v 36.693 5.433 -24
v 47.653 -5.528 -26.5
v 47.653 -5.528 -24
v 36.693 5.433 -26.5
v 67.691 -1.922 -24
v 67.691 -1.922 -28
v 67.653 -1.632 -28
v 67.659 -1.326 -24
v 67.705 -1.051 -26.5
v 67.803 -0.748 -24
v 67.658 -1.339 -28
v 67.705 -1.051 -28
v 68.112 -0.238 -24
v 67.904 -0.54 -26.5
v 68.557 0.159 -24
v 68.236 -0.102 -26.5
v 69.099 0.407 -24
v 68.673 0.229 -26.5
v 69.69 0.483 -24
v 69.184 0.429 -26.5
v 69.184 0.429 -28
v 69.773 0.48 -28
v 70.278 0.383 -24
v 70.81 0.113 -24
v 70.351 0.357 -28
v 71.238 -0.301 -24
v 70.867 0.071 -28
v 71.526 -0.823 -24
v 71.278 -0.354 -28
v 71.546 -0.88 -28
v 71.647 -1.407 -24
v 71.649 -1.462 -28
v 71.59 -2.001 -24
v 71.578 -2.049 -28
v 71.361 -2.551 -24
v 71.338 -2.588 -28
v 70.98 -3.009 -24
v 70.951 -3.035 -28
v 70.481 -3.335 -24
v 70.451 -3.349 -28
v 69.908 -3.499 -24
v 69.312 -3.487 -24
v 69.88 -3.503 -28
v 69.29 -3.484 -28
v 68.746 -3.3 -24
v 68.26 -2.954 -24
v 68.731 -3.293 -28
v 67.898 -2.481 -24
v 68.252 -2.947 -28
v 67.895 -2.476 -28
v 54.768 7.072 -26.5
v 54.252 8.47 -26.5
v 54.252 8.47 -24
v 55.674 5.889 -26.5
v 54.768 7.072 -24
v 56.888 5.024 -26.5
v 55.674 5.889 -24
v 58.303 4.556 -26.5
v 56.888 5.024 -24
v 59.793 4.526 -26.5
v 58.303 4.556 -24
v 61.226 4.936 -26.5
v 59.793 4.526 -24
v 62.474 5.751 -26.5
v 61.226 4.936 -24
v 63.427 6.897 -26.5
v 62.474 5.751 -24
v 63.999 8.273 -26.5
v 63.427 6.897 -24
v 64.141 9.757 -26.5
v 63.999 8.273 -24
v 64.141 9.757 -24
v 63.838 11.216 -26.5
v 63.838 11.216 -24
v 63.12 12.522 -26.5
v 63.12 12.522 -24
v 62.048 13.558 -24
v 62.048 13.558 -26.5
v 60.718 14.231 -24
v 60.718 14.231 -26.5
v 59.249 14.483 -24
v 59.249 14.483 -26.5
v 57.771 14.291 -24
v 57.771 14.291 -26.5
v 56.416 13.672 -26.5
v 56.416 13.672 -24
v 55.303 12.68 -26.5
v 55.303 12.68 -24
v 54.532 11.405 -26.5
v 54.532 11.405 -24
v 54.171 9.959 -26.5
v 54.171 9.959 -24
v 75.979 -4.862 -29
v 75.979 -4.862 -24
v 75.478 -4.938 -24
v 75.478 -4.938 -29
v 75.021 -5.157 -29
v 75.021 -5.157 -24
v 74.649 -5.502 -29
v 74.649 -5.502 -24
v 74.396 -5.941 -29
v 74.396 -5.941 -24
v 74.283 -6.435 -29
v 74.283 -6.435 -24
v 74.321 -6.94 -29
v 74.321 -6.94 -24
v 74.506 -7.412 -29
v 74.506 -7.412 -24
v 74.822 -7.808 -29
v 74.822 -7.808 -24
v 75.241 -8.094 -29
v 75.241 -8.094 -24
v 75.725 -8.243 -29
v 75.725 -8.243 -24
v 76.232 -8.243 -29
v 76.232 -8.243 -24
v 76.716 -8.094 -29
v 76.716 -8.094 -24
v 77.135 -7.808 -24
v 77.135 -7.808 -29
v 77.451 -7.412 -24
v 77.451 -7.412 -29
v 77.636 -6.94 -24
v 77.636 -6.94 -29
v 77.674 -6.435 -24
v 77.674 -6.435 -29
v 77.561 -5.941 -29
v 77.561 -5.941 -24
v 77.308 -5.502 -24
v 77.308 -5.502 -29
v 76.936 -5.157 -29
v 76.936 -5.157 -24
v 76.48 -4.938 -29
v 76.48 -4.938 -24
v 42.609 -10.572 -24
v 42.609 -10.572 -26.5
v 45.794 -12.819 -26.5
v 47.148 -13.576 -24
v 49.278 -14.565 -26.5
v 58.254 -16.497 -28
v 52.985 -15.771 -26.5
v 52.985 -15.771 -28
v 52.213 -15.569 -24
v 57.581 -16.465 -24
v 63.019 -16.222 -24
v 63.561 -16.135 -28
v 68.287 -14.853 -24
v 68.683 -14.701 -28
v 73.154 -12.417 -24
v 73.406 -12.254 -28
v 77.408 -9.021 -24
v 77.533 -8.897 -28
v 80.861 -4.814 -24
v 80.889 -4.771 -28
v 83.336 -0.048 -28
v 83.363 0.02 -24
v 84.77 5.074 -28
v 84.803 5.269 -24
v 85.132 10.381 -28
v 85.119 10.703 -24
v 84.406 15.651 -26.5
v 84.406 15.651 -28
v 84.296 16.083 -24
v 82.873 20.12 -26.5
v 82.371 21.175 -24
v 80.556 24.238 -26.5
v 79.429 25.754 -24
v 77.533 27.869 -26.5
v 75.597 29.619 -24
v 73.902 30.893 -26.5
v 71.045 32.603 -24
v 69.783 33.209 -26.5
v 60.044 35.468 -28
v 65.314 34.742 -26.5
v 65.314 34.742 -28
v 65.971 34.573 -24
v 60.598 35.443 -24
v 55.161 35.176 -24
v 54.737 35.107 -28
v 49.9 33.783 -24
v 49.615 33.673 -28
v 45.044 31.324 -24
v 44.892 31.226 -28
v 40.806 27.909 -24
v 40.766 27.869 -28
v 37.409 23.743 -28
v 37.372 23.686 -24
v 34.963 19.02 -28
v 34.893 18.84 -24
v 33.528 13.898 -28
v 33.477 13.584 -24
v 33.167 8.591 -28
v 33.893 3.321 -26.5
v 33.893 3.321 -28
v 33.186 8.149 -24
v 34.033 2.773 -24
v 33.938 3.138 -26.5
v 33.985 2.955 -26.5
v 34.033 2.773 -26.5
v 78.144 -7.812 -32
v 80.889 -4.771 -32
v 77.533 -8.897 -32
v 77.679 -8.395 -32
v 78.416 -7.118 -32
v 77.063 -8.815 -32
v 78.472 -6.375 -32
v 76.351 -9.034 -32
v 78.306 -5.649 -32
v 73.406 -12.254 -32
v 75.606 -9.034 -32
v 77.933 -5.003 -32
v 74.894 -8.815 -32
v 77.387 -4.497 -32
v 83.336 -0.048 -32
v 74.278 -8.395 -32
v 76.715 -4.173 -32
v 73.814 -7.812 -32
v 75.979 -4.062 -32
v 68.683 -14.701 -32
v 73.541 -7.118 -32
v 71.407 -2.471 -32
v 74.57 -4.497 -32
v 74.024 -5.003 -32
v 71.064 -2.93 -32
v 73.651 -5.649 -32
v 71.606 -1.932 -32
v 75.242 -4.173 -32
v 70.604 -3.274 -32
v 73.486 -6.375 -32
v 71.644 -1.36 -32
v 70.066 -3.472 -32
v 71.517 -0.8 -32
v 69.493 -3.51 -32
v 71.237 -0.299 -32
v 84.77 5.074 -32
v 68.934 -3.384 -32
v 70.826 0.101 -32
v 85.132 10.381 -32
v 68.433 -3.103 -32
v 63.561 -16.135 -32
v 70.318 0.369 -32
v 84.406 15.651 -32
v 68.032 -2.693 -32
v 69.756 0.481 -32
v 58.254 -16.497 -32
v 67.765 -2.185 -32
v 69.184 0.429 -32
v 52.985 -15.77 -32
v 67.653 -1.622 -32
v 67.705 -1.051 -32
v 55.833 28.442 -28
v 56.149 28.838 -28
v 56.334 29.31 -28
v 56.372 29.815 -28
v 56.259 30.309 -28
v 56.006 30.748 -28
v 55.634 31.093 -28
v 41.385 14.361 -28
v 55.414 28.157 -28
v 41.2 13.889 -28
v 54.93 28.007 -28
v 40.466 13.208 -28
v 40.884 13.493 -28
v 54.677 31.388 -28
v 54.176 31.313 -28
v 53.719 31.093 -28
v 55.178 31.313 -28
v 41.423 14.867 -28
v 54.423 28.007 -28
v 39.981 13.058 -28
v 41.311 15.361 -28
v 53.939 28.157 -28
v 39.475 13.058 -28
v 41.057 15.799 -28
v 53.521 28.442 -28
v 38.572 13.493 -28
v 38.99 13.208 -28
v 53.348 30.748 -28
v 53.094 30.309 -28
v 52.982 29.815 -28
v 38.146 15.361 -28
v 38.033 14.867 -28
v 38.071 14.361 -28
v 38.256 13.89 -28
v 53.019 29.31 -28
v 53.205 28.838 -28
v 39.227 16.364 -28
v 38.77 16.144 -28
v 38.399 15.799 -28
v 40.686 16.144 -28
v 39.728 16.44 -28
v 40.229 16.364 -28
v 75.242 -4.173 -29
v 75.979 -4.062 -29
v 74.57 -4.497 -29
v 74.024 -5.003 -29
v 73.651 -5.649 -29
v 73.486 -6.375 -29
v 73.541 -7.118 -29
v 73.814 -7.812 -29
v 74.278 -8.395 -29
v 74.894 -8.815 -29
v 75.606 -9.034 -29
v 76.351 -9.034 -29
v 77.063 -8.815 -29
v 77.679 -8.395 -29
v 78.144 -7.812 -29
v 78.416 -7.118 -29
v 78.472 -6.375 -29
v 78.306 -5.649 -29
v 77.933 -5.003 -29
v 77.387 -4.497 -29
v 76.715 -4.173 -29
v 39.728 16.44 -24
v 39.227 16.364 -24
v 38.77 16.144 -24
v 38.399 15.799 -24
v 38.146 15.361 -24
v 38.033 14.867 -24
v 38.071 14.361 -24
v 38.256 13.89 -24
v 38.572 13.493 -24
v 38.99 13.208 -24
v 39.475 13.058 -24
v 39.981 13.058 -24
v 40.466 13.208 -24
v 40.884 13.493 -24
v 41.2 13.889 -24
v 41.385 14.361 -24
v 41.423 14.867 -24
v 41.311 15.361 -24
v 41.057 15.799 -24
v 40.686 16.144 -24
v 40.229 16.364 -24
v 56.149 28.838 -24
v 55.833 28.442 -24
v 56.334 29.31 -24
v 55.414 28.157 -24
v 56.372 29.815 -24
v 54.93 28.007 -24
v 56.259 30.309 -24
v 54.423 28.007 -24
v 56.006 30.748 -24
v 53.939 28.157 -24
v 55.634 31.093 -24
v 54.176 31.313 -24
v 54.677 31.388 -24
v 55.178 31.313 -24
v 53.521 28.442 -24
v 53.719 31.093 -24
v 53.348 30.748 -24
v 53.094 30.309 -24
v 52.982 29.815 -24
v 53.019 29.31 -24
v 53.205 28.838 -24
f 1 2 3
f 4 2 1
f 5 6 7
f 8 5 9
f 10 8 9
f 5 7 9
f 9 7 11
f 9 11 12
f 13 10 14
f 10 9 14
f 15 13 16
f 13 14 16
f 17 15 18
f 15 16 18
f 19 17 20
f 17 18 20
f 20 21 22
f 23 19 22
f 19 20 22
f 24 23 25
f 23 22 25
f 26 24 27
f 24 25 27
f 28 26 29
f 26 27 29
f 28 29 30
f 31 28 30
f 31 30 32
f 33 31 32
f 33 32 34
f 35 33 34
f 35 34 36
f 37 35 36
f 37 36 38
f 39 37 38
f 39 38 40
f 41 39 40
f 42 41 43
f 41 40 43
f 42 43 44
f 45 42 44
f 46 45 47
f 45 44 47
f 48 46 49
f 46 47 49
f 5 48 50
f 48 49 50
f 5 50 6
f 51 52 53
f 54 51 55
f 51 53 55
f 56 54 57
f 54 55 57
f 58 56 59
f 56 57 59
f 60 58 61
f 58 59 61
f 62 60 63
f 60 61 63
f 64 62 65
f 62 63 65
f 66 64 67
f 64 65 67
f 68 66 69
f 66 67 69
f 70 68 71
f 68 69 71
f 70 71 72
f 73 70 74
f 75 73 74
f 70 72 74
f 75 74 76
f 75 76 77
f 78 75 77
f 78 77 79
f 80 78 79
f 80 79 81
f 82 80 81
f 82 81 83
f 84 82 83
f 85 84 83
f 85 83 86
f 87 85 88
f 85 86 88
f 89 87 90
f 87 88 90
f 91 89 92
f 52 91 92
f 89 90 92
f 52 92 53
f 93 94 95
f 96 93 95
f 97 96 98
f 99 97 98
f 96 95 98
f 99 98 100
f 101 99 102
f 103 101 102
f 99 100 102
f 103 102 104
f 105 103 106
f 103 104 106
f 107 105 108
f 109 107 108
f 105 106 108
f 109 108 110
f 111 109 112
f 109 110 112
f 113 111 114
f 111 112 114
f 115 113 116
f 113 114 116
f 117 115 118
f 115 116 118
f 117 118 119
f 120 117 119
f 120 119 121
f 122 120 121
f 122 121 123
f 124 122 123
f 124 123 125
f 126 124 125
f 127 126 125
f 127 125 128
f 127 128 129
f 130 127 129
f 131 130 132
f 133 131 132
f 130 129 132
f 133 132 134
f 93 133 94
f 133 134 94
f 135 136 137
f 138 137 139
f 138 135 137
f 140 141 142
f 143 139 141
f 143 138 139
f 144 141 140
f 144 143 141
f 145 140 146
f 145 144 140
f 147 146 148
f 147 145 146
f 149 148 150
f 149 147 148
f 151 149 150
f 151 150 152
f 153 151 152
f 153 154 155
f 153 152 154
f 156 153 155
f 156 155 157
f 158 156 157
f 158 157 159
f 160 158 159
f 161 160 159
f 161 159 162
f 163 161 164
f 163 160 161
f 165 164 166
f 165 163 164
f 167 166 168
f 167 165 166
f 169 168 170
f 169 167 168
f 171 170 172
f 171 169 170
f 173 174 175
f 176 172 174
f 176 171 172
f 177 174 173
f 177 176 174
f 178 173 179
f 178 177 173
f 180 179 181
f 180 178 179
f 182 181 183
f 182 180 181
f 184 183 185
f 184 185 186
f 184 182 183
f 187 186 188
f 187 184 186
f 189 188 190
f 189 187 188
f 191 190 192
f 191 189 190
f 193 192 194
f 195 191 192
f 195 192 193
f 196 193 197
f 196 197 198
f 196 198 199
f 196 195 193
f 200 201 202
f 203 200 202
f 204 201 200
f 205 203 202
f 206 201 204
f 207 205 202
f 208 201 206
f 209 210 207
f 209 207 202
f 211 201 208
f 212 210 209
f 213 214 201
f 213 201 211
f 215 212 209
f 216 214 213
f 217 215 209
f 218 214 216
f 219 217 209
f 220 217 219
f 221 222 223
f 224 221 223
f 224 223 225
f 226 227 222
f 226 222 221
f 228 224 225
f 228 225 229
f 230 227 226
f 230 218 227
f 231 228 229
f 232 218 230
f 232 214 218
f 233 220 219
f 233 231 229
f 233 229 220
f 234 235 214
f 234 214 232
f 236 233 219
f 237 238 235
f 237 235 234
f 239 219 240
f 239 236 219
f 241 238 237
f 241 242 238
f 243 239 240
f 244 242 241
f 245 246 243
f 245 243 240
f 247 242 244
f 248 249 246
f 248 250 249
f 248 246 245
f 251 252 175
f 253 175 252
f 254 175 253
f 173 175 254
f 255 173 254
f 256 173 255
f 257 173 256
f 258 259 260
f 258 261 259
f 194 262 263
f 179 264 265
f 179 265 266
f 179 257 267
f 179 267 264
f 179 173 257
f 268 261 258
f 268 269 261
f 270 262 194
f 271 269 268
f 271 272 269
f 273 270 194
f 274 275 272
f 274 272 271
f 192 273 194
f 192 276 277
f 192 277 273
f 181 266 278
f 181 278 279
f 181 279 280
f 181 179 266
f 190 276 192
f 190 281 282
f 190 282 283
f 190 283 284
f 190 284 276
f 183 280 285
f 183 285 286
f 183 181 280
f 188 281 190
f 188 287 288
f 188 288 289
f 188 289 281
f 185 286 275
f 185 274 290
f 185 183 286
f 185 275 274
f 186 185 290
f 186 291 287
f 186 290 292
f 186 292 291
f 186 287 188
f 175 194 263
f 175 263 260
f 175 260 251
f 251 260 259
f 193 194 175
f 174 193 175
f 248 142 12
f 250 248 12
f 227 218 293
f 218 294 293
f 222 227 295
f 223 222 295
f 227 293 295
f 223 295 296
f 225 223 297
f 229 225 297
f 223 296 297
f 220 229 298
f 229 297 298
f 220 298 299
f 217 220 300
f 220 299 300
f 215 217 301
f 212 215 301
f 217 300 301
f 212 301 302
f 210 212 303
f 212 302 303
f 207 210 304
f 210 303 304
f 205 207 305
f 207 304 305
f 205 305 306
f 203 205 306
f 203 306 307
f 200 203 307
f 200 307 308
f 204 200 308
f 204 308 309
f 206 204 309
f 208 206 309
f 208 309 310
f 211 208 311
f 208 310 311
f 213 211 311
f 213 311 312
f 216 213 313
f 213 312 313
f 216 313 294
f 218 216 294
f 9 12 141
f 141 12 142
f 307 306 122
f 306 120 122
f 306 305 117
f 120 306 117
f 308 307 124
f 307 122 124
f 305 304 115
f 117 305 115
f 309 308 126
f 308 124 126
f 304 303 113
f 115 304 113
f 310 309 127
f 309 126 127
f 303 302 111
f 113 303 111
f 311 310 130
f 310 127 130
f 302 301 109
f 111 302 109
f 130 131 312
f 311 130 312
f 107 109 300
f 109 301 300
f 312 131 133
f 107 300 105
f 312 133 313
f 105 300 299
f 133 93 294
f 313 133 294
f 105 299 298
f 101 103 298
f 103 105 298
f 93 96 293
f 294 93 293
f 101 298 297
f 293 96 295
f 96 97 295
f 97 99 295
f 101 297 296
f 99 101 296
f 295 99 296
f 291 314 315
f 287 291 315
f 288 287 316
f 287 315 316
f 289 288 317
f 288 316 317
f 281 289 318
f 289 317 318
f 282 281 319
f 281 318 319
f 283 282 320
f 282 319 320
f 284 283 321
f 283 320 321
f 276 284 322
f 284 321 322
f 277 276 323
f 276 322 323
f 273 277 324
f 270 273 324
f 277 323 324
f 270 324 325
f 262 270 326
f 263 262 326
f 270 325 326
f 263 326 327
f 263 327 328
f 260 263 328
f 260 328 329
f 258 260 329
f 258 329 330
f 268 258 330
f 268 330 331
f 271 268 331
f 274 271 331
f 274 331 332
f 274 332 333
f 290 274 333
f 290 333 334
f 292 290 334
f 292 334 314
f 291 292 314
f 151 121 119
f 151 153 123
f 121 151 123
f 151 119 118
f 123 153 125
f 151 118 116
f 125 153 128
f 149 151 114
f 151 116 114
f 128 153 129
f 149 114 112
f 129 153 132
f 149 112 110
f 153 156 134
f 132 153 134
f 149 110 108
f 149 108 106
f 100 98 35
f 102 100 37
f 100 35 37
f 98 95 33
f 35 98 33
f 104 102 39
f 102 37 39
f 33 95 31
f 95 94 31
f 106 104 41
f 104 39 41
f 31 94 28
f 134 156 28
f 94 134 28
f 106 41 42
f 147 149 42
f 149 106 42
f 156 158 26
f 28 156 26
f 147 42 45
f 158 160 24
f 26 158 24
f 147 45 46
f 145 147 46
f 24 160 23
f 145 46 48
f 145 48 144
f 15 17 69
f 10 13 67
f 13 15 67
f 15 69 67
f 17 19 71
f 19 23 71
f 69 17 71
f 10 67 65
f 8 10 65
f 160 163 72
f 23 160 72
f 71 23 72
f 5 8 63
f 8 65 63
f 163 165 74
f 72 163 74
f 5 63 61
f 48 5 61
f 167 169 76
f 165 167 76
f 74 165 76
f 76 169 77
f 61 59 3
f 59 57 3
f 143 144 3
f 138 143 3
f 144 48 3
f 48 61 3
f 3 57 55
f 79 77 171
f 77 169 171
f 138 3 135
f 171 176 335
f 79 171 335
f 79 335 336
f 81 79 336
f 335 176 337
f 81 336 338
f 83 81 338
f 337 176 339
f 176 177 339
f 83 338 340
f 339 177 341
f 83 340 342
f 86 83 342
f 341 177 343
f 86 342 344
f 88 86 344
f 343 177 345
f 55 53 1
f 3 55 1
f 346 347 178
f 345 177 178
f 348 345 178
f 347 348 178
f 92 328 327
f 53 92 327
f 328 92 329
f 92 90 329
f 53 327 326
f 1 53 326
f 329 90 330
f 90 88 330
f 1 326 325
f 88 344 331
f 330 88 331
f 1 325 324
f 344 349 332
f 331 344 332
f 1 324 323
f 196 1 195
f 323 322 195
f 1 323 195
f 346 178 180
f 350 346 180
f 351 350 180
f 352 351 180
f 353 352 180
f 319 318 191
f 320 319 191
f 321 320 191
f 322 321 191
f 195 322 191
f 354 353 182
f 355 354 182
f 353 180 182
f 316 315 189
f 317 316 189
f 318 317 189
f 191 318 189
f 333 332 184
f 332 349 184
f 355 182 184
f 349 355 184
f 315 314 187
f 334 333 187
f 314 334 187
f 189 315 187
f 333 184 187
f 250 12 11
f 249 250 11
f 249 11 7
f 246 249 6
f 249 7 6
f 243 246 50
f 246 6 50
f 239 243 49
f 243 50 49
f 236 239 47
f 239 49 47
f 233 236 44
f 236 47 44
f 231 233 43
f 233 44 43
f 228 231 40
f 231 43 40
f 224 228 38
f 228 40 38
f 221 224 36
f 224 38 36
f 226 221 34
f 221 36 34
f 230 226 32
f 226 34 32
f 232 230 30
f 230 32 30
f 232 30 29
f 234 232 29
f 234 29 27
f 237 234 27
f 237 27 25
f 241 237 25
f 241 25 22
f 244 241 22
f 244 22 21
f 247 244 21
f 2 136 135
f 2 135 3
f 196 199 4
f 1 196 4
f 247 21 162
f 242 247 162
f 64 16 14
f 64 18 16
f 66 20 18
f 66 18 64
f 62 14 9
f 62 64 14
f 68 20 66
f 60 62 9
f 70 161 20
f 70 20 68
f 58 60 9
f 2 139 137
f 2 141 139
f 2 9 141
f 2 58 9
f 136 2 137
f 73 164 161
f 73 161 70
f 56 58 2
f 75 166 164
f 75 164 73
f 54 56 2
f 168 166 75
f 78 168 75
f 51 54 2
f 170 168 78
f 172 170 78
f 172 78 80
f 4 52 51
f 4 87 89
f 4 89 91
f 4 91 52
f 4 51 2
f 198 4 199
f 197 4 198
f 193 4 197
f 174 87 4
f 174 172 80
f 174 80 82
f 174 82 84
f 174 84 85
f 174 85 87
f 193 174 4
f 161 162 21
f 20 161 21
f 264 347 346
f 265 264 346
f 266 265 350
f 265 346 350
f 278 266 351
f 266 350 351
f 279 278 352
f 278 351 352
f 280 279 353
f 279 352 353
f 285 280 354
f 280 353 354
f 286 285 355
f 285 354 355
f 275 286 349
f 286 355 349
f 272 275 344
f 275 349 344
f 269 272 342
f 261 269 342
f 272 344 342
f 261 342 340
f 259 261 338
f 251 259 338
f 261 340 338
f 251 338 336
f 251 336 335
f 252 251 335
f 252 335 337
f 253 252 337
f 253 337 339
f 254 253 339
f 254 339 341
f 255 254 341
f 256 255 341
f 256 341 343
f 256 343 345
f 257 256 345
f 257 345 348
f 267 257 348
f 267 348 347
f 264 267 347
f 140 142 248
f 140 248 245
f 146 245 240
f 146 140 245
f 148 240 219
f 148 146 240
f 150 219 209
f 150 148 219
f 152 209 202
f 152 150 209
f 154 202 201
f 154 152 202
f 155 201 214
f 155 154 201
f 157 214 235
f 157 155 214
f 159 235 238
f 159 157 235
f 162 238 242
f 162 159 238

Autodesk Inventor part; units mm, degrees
ref_plane "YZ Plane" through (0, 0, 0) normal (1, 0, 0) x (0, 1, 0)
ref_plane "XZ Plane" through (0, 0, 0) normal (0, 1, 0) x (-1, 0, 0)
ref_plane "Work Plane1" through (69.3531, 0, -24) normal (0, 0, -1) x (-0.9792327, -0.2027397, 0)
sketch "Sketch1" plane through (69.3531, 0, -24) normal (0, 0, -1) x (-0.9792327, -0.2027397, 0)
  circle A0 centre (8.0687, 11.3576) radius 25.9979 projected
  circle A1 centre (8.0703, 11.3562) radius 3.8103 projected
  circle A2 centre (8.0703, 11.3562) radius 5
  point P0 (67.9128, 14.0606)
  dimension "d0" = 10
extrude "Extrusion1" add sketch "Sketch1" along normal blind 4 contours A0
sketch "Sketch2" plane through (59.1493, 9.4859, -28) normal (0, 0, -1) x (-1, 0, 0)
  line L0 (59.1493, -50.593) -> (59.1493, 54.0449) projected
  line L1 (-54.0467, -9.4859) -> (50.5907, -9.4859) projected
  line L2 (-15.9479, -15.1669) -> (4.4725, 20.2023)
  line L3 (4.4725, 20.2023) -> (19.4213, 5.2535)
  line L4 (19.4213, 5.2535) -> (-15.9479, -15.1669)
  line L5 (-39.0985, 39.0967) -> (35.6425, -35.6447)
  line L6 (-0.781, 0) -> (9.2905, 10.0715)
  line L7 (-0.781, 0) -> (13.4622, 0) construction
  line L8 (-15.9479, -15.1669) -> (-0.781, 0)
  circle A0 centre (4.4725, 20.2023) radius 1.6
  circle A1 centre (19.4213, 5.2535) radius 1.6
  circle A2 centre (-15.9479, -15.1669) radius 1.6 construction
  circle A3 centre (-16.8292, -16.048) radius 1.5
  dimension "d17" = 18
  dimension "d18" = 22
  dimension "d19" = 30
  dimension "d20" = 45
  dimension "d21" = 15
  dimension "d22" = 3.2
  dimension "d23" = 3.2
  dimension "d24" = 3.2
  dimension "d39" = 3
extrude "Extrusion2" cut sketch "Sketch2" against normal blind 3.4 contours A3 L8 L2 | L2 L4 A3 | A3 L4 L8 | A0 L3 L2 | L2 L3 A0 | A1 L3 L4 | L4 L3 A1
sketch "Sketch3" plane through (59.1493, 9.4859, -28) normal (0, 0, -1) x (-1, 0, 0)
  line L0 (-35.7047, 22.4019) -> (13.1872, -35.1292) projected
  line L1 (32.542, -18.6808) -> (-16.3499, 38.8503) projected
  line L2 (40.2702, -21.1784) -> (-21.1782, 40.2703)
  line L3 (-21.1782, 40.2703) -> (-40.2702, 21.1784)
  line L4 (-40.2702, 21.1784) -> (21.1782, -40.2703)
  line L5 (21.1782, -40.2703) -> (40.2702, -21.1784)
  line L6 (40.2702, -21.1784) -> (-40.2702, 21.1784) construction
  line L7 (-21.1782, 40.2703) -> (21.1782, -40.2703) construction
  point P0 (0, 0)
  dimension "d16" = 27
extrude "Extrusion3" cut sketch "Sketch3" against normal blind 1.5
sketch "Sketch4" plane through (69.3531, 0, -28) normal (0, 0, -1) x (-0.9792327, -0.2027397, 0)
  circle A0 centre (0.0169, -1.5448) radius 2 projected
extrude "Extrusion4" cut sketch "Sketch4" against normal blind 25.4
sketch "Sketch6" plane through (69.3531, 0, -28) normal (0, 0, -1) x (-0.9792327, -0.2027397, 0)
  line L0 (-28.7292, -8.8539) -> (-25.804, -10.7757) projected
  line L1 (-20.2187, 4.1006) -> (-28.7292, -8.8539) projected
  line L2 (-20.2187, 4.1006) -> (-17.2935, 2.1789) projected
  circle A0 centre (-5.1575, -7.7691) radius 1.5 projected
  line L3 (0.0784, 0.4542) -> (-17.9131, 12.2738) projected
  arc A1 (-17.9131, 12.2738) -> (19.2256, -12.1245) centre (8.0687, 11.3576) ccw projected
  line L4 (-28.7292, -8.8539) -> (-20.2187, 4.1006)
  line L5 (-20.2187, 4.1006) -> (-38.152, 15.8819)
  line L6 (-38.152, 15.8819) -> (-46.6625, 2.9274)
  line L7 (-46.6625, 2.9274) -> (-28.7292, -8.8539)
  line L8 (-52.6907, 6.8876) -> (-44.1802, 19.8422)
  line L9 (-44.1802, 19.8422) -> (-14.4793, 0.3302)
  line L10 (-37.9848, 15.7721) -> (-46.4954, 2.8175)
  line L11 (-46.4954, 2.8175) -> (-42228058.7703, 27741750.5128)
  line L12 (-42228058.7703, 27741750.5128) -> (-52.6907, 6.8876)
  line L13 (-14.4793, 0.3302) -> (-37.9848, 15.7721)
  circle A2 centre (-5.1575, -7.7691) radius 1.5 projected
  circle A3 centre (-5.1575, -7.7691) radius 1.7
  circle A4 centre (26.0215, 20.4395) radius 2.75 projected
  circle A5 centre (8.3525, 32.0472) radius 2.45 projected
  circle A6 centre (26.0215, 20.4395) radius 1.6
  circle A7 centre (8.3525, 32.0472) radius 1.6
  arc A8 (0.0784, 0.4542) -> (1.8272, -0.6947) centre (0.0169, -1.5448) ccw projected
  line L14 (19.2256, -12.1245) -> (1.8272, -0.6947) projected
  point P0 (67.9128, 14.0606)
  point P1 (8.0213, -4.7639)
  point P2 (-4.9332, 3.7467)
  dimension "d44" = 0
  dimension "d47" = 0
  dimension "d48" = 3.4
  dimension "d49" = 3.2
  dimension "d50" = 3.2
extrude "Extrusion6" add sketch "Sketch6" along normal blind 4 contours A8 L14 A1 L3 | A3
sketch "Sketch7" plane through (69.3531, 0, -32) normal (0, 0, -1) x (-0.9792327, -0.2027397, 0)
  circle A0 centre (-5.1575, -7.7691) radius 2.45 projected
  circle A1 centre (8.3525, 32.0472) radius 2.75 projected
  circle A2 centre (26.0215, 20.4395) radius 2.75 projected
  point P0 (67.9128, 14.0606)
hole "Hole1" at (39.7281, 14.7395, -32) at (54.6768, 29.6883, -32) at (75.9786, -6.5621, -32) direction (0, 0, 1) diameter 3.4 end through all counterbore diameter 5 counterbore depth 3
sketch "Sketch8" plane through (69.3531, 0, -32) normal (0, 0, -1) x (-0.9792327, -0.2027397, 0)
  line L0 (22.3699, -1.0133) -> (13.834, 4.5943) projected
  line L1 (13.834, 4.5943) -> (22.3444, 17.5489) projected
  line L2 (30.8803, 11.9413) -> (22.3444, 17.5489) projected
  line L3 (22.3699, -1.0133) -> (30.8803, 11.9413) projected
  line L4 (29.1977, -5.4988) -> (37.7081, 7.4558) projected
  line L5 (29.1977, -5.4988) -> (22.3699, -1.0133) projected
  line L6 (37.7081, 7.4558) -> (30.8803, 11.9413) projected
  line L7 (29.1977, -5.4988) -> (37.7081, 7.4558)
  line L8 (37.7081, 7.4558) -> (48.711, 0.2276)
  line L9 (48.711, 0.2276) -> (40.2006, -12.7271)
  line L10 (40.2006, -12.7271) -> (29.1977, -5.4988)
  point P0 (67.9128, 14.0606)
  point P1 (11.3572, 0.3138)
  point P2 (-1.5974, 8.8243)
  point P3 (14.9357, 6.2713)
ref_plane "Work Plane2" through (12.9398, -24.5988, -20.5) normal (0, 0, 1) x (0.7071087, 0.7071049, 0)
extrude "Extrusion7" cut sketch "Sketch8" against normal up to surface (11.5 mm away) contours L3 L6 L4 L5
properties part number "Matchboxscope_sample_v0"
